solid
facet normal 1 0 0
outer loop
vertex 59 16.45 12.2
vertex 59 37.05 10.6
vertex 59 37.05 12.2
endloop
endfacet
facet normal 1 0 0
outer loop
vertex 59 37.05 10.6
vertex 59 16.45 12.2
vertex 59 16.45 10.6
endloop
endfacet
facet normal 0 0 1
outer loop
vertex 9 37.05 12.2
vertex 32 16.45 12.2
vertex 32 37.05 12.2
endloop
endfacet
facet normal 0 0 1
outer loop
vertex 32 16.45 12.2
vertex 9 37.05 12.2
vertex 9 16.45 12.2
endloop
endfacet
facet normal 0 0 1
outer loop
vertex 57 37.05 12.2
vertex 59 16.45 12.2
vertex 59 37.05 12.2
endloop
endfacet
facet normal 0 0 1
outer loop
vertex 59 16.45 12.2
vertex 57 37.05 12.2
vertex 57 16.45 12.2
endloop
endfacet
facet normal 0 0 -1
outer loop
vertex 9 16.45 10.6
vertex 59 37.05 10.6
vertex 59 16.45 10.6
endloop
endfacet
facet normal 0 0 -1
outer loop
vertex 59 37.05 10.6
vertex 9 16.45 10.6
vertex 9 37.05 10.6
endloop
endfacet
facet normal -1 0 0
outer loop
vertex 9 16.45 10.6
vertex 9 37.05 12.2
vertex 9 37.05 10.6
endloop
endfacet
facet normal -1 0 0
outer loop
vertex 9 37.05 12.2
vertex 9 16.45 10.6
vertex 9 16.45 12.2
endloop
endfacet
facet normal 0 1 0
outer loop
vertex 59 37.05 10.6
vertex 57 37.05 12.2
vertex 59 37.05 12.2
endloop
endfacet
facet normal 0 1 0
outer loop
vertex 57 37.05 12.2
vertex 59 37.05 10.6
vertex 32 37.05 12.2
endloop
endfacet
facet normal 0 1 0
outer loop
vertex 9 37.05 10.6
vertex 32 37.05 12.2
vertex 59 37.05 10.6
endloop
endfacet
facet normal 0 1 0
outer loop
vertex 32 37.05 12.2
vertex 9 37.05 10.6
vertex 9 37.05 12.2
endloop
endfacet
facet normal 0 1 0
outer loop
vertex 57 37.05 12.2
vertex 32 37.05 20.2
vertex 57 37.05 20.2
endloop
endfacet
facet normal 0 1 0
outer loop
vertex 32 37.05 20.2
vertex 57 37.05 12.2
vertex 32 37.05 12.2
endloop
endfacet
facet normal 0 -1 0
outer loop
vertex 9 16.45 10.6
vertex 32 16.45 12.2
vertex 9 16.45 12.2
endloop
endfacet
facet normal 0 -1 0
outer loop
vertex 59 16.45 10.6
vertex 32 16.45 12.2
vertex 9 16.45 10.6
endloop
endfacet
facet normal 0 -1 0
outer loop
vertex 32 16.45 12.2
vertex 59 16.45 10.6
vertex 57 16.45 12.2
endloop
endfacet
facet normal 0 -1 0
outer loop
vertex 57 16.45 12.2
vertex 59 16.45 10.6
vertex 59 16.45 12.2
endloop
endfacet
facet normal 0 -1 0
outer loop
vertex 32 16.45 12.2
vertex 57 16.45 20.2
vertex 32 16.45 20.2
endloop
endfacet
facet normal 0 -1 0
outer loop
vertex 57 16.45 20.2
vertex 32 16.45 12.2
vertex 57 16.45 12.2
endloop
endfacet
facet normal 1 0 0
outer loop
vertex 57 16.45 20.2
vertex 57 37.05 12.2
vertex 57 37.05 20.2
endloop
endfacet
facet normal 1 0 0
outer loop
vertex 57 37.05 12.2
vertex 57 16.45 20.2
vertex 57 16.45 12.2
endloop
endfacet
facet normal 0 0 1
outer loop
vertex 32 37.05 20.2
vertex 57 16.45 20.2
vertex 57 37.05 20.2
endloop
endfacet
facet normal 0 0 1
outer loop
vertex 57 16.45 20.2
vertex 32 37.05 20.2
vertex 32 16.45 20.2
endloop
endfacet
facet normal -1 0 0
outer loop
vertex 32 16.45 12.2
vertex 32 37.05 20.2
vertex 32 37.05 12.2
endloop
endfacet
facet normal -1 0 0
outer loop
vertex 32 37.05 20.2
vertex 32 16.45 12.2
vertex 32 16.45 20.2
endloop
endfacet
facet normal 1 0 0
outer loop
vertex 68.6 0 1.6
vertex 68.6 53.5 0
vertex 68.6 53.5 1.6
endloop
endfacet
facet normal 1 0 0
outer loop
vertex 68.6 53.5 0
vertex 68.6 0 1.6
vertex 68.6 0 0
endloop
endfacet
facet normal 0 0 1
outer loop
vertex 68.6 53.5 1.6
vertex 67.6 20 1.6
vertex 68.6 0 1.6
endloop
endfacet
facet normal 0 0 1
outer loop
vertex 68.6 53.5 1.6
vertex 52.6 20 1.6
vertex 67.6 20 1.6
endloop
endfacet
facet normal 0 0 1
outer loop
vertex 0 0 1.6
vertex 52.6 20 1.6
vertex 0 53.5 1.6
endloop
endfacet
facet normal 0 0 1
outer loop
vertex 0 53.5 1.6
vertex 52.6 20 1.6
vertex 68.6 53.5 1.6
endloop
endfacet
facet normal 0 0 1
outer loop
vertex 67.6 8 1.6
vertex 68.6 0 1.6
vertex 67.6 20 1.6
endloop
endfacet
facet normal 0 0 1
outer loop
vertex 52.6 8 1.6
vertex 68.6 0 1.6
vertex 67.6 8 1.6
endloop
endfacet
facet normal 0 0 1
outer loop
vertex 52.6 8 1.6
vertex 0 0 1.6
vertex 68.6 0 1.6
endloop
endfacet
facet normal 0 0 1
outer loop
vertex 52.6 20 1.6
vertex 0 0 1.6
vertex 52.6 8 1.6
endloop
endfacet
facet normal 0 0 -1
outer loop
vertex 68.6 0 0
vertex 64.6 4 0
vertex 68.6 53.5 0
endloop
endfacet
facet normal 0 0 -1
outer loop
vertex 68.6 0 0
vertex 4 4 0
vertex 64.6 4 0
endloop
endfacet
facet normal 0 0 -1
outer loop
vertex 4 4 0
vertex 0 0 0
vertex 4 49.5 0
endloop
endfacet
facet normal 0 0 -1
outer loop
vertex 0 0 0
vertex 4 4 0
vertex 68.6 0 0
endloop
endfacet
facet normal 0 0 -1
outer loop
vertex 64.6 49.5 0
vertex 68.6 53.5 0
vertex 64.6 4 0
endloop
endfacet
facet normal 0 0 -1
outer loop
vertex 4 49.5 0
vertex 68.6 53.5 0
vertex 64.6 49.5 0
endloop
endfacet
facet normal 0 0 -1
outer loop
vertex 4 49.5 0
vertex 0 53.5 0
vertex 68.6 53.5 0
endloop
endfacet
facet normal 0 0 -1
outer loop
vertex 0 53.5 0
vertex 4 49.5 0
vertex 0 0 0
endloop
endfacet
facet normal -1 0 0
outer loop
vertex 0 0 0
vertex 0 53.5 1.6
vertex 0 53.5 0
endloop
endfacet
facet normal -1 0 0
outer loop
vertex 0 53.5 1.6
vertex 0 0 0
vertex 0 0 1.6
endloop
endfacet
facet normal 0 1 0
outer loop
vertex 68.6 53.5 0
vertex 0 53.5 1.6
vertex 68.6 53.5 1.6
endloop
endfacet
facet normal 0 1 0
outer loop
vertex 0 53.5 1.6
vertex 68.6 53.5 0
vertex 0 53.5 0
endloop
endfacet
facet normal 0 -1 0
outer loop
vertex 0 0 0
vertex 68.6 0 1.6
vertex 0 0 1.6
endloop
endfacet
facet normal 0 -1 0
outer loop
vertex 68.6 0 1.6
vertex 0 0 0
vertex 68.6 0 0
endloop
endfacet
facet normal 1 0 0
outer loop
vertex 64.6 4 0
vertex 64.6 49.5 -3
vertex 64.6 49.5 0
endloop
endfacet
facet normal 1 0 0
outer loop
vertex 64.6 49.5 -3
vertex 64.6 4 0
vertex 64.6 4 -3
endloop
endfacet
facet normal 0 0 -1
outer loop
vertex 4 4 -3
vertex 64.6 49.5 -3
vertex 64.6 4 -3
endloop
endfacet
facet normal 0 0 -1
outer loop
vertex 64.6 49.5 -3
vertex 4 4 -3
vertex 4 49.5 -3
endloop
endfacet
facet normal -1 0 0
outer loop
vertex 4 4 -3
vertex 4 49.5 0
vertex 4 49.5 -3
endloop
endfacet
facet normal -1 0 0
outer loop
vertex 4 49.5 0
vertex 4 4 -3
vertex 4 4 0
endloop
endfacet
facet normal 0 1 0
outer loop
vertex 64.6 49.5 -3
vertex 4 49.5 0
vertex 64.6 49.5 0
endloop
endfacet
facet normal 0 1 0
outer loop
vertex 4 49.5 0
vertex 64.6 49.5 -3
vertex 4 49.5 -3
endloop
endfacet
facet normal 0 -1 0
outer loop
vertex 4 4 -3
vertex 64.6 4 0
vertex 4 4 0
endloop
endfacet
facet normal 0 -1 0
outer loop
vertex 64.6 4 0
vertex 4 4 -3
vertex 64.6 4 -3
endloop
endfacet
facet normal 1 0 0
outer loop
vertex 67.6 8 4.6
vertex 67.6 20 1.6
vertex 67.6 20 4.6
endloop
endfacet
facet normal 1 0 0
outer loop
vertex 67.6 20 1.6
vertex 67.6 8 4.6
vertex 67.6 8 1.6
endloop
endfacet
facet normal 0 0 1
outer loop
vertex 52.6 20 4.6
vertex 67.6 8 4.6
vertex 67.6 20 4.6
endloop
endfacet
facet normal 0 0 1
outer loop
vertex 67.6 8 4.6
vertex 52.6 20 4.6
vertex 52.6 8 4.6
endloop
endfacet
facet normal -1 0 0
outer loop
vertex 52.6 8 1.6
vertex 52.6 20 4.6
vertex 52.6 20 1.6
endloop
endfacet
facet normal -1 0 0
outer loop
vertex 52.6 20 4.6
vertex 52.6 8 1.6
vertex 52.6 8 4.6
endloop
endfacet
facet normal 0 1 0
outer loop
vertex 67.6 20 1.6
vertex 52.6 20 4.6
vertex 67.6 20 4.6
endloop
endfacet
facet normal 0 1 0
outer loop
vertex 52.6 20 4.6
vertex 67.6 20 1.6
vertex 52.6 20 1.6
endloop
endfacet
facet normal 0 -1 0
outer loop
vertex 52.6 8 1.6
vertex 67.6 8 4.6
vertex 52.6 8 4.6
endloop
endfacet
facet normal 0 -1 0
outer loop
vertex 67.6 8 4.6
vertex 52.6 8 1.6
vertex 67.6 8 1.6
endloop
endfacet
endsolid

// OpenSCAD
// =====================================================================
// spresense_logger.scad — SPRESENSE 独立 IMU ロガー 簡易モデル (購入品)
// 拡張ボード CXD5602PWBEXT1 (68.6×53.5) + メインボード (50×20.6) +
// Multi-IMU Add-on を積んだスタックの配置検討・アセンブリ用プレースホルダ。
// 印刷対象ではない。寸法は Sony 公称 + スタック高さ仮値 (要実測)。
// 原点: 拡張ボード左下 (0,0,0)。X=68.6 / Y=53.5 / Z=上。
// =====================================================================

/* [拡張ボード (公称)] */
ext_w = 68.6;
ext_d = 53.5;
pcb_t = 1.6;

/* [メインボード (公称 50×20.6)、ヘッダ約 9mm 上に載る (仮)] */
main_w = 50;
main_d = 20.6;
header_h = 9;      // 仮値 (要実測)

/* [Multi-IMU Add-on (公称 20×25 級、メイン上に約 8mm) 仮] */
imu_w = 25;
imu_d = 20.6;
imu_h = 8;         // 仮値 (要実測)

/* [下面リード余裕] */
under_h = 3;

// 拡張ボード
translate([0, 0, 0]) cube([ext_w, ext_d, pcb_t]);
// 下面リード (簡易)
translate([4, 4, -under_h]) cube([ext_w - 8, ext_d - 8, under_h]);
// メインボード (拡張ボードの片側に寄せる: コネクタ位置は仮)
translate([9, (ext_d - main_d)/2, pcb_t + header_h]) {
    cube([main_w, main_d, pcb_t]);
    // Multi-IMU Add-on
    translate([main_w - imu_w - 2, 0, pcb_t]) cube([imu_w, imu_d, imu_h]);
}
// microSD スロット目印 (拡張ボード縁, 仮)
translate([ext_w - 16, 8, pcb_t]) cube([15, 12, 3]);
